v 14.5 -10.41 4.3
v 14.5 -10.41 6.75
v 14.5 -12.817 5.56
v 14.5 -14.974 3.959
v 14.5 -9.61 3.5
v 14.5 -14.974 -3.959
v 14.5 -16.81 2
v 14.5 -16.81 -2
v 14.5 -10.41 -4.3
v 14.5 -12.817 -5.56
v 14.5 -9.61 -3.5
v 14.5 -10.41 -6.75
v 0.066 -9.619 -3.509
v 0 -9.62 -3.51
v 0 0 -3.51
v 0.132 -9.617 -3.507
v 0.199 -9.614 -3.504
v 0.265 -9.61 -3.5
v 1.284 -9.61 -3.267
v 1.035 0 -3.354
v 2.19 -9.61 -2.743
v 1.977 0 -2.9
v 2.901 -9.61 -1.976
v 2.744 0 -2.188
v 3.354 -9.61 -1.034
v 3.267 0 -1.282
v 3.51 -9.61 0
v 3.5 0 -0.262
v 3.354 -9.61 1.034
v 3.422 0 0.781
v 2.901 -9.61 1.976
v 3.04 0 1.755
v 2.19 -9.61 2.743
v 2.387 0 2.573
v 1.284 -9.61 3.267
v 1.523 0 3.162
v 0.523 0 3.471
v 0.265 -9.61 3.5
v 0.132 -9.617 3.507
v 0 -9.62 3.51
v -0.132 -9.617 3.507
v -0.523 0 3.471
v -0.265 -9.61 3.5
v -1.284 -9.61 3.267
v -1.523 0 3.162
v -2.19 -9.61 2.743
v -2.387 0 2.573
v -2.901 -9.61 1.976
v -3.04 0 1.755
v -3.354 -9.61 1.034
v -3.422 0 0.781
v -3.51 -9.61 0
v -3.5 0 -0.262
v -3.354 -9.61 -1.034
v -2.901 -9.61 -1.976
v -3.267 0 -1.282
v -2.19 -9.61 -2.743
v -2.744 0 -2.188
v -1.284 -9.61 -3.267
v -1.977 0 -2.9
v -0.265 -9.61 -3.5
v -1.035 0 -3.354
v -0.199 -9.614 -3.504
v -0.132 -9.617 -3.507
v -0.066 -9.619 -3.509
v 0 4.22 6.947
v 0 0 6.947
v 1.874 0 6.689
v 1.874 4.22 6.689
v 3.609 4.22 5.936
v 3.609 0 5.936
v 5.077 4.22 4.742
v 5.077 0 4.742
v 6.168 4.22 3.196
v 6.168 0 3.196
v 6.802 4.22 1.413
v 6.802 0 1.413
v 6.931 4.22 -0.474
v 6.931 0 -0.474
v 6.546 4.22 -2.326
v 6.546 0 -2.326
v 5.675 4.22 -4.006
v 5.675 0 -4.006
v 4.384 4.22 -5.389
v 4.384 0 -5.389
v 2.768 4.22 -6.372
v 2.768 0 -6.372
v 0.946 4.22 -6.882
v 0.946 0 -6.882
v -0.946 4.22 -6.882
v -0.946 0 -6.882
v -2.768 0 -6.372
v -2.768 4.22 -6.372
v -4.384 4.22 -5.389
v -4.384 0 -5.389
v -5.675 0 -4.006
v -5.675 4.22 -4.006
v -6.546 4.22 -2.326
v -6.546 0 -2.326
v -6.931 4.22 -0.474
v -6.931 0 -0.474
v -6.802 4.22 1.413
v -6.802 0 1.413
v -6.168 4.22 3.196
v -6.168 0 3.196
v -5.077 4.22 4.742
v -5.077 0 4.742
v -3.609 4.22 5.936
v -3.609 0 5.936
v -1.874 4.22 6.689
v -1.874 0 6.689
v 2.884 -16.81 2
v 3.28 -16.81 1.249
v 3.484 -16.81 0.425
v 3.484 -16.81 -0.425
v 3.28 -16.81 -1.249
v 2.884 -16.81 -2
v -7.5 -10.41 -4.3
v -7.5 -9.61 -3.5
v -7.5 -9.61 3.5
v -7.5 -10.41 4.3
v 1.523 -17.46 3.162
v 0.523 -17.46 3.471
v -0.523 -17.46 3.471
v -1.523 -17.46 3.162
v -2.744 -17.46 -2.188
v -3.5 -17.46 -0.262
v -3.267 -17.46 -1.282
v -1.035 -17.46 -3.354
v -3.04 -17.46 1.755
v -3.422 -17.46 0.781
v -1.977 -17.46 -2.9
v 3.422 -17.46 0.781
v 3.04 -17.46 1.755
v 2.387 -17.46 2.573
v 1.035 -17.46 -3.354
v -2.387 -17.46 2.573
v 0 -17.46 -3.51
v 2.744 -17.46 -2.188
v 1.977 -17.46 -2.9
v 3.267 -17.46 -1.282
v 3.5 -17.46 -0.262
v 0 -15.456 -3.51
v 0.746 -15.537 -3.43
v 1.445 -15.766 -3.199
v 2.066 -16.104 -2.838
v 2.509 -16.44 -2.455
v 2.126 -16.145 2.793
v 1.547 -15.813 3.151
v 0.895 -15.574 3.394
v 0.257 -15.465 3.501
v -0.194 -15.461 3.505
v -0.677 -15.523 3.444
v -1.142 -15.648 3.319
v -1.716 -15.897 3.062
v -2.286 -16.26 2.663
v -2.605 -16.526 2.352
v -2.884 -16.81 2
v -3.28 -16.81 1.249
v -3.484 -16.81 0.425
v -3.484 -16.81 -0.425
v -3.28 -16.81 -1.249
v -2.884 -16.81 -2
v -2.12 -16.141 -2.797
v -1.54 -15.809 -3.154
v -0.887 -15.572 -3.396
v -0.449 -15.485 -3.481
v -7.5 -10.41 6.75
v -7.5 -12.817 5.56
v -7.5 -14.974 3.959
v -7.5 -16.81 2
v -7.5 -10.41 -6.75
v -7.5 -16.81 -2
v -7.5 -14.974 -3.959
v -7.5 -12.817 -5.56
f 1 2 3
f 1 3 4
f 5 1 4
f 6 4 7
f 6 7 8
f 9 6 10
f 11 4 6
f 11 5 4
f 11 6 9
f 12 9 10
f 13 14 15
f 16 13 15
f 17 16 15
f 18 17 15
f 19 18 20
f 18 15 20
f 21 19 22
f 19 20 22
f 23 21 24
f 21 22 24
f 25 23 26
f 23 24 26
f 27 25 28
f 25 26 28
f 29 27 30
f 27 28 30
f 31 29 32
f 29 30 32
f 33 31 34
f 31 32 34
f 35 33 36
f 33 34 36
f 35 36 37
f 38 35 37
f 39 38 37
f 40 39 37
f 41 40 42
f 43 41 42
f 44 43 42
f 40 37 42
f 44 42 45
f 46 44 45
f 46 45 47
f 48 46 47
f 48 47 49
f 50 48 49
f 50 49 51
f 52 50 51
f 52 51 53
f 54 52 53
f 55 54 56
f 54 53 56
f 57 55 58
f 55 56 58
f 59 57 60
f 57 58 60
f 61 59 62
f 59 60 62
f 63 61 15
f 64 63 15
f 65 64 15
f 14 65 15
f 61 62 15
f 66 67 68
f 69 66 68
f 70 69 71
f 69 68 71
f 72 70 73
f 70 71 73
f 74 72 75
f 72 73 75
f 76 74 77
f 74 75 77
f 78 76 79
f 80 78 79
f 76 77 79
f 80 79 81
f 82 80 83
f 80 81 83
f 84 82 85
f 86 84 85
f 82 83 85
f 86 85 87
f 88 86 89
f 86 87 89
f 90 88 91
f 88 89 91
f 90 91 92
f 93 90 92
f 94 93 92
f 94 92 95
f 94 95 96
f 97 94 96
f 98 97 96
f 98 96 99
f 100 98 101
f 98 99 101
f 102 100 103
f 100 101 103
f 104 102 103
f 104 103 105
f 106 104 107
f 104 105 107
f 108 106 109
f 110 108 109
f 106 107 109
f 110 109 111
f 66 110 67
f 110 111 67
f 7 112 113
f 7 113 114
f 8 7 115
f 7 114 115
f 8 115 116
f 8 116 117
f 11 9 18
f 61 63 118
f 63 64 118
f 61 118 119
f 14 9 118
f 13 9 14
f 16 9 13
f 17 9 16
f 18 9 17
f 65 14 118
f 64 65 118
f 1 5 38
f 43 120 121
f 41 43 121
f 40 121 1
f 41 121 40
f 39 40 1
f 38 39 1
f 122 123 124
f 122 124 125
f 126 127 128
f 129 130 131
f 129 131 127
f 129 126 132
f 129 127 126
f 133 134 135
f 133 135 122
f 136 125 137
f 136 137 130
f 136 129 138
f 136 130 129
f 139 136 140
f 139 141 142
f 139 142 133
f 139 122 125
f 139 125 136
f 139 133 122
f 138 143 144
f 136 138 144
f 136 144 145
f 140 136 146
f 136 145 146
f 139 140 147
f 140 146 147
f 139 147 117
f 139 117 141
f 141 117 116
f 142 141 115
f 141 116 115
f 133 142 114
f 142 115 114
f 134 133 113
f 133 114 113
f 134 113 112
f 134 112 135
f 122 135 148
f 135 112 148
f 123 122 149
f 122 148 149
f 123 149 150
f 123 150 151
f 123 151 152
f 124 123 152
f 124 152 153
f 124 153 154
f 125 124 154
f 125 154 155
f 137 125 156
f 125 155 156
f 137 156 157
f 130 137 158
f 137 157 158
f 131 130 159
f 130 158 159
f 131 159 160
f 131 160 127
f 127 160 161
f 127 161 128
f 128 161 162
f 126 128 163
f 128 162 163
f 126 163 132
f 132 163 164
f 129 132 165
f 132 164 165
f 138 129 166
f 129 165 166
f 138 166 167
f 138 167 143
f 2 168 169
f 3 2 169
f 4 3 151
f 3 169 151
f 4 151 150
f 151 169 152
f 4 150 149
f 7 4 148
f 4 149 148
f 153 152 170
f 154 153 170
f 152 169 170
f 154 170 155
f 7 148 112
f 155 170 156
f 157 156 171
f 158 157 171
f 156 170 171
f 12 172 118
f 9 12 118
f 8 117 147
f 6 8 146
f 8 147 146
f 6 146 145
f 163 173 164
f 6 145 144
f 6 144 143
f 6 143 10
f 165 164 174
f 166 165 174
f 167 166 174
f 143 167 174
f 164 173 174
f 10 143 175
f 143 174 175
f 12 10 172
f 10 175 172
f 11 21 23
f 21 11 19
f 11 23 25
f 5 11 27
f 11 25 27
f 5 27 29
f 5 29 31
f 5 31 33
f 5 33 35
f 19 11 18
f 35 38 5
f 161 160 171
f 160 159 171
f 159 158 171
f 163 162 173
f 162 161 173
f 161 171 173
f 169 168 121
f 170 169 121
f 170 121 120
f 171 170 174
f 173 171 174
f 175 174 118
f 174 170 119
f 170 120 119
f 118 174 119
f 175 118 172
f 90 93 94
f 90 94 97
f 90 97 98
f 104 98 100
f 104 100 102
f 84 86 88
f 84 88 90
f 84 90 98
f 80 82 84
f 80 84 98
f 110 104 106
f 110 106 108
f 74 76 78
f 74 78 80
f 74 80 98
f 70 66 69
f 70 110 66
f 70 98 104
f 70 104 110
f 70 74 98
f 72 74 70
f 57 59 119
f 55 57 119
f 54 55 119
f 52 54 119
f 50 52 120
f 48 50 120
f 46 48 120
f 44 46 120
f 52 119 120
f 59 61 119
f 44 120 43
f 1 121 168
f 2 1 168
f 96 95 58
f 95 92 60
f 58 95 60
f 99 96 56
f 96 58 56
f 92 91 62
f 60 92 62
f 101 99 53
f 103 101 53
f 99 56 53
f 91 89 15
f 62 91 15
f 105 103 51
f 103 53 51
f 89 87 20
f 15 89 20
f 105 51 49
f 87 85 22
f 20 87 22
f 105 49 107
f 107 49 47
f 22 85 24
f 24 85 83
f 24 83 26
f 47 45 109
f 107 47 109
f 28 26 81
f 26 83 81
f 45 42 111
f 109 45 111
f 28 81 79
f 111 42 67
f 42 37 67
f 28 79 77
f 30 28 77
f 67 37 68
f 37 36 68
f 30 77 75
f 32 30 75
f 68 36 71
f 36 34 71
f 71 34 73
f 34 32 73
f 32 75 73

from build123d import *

# Parameters (mm, degrees)
SKETCH1_R                = 6.9469
BOSS_EXTRUDE1_DEPTH      = 4.22
SKETCH2_R                = 3.51
BOSS_EXTRUDE2_DEPTH      = 17.46
BOSS_EXTRUDE3_DEPTH      = 14.5
BOSS_EXTRUDE3_DEPTH_BACK = 7.5


with BuildPart() as part:
    # Sketch1 → Boss-Extrude1 (new body)
    with BuildSketch(Plane(origin=(0, 0, 0), x_dir=(1, 0, 0), z_dir=(0, 1, 0))):
        with Locations(Location((0, 0, 0), (0, 0, 270))):
            Circle(SKETCH1_R)
    extrude(amount=BOSS_EXTRUDE1_DEPTH)

    # Sketch2 → Boss-Extrude2 (add)
    with BuildSketch(Plane(origin=(0, 0, 0), x_dir=(-1, 0, 0), z_dir=(0, -1, 0))):
        with Locations(Location((0, 0, 0), (0, 0, 90))):
            Circle(SKETCH2_R)
    extrude(amount=BOSS_EXTRUDE2_DEPTH)

    # Sketch3 → Boss-Extrude3 (add, two sides: drawn at the far end of the back side and taken through both)
    with BuildSketch(Plane(origin=(0, 0, 0), x_dir=(0, 0, -1), z_dir=(1, 0, 0)).offset(-BOSS_EXTRUDE3_DEPTH_BACK)):
        with BuildLine():
            Line((-6.249999984, -10.41), (-6.75, -10.41))
            ThreePointArc((-6.75, -10.41), (-4.807849454, -13.931255454), (-2, -16.81))
            Line((-2, -16.81), (2, -16.81))
            ThreePointArc((2, -16.81), (4.807849454, -13.931255454), (6.75, -10.41))
            Line((6.75, -10.41), (6.249999984, -10.41))
            Line((6.249999984, -10.41), (4.3, -10.41))
            Line((4.3, -10.41), (3.5, -9.61))
            Line((3.5, -9.61), (-3.5, -9.61))
            Line((-3.5, -9.61), (-4.3, -10.41))
            Line((-4.3, -10.41), (-6.249999984, -10.41))
        make_face()
    extrude(amount=BOSS_EXTRUDE3_DEPTH + BOSS_EXTRUDE3_DEPTH_BACK)


solid = part.part
